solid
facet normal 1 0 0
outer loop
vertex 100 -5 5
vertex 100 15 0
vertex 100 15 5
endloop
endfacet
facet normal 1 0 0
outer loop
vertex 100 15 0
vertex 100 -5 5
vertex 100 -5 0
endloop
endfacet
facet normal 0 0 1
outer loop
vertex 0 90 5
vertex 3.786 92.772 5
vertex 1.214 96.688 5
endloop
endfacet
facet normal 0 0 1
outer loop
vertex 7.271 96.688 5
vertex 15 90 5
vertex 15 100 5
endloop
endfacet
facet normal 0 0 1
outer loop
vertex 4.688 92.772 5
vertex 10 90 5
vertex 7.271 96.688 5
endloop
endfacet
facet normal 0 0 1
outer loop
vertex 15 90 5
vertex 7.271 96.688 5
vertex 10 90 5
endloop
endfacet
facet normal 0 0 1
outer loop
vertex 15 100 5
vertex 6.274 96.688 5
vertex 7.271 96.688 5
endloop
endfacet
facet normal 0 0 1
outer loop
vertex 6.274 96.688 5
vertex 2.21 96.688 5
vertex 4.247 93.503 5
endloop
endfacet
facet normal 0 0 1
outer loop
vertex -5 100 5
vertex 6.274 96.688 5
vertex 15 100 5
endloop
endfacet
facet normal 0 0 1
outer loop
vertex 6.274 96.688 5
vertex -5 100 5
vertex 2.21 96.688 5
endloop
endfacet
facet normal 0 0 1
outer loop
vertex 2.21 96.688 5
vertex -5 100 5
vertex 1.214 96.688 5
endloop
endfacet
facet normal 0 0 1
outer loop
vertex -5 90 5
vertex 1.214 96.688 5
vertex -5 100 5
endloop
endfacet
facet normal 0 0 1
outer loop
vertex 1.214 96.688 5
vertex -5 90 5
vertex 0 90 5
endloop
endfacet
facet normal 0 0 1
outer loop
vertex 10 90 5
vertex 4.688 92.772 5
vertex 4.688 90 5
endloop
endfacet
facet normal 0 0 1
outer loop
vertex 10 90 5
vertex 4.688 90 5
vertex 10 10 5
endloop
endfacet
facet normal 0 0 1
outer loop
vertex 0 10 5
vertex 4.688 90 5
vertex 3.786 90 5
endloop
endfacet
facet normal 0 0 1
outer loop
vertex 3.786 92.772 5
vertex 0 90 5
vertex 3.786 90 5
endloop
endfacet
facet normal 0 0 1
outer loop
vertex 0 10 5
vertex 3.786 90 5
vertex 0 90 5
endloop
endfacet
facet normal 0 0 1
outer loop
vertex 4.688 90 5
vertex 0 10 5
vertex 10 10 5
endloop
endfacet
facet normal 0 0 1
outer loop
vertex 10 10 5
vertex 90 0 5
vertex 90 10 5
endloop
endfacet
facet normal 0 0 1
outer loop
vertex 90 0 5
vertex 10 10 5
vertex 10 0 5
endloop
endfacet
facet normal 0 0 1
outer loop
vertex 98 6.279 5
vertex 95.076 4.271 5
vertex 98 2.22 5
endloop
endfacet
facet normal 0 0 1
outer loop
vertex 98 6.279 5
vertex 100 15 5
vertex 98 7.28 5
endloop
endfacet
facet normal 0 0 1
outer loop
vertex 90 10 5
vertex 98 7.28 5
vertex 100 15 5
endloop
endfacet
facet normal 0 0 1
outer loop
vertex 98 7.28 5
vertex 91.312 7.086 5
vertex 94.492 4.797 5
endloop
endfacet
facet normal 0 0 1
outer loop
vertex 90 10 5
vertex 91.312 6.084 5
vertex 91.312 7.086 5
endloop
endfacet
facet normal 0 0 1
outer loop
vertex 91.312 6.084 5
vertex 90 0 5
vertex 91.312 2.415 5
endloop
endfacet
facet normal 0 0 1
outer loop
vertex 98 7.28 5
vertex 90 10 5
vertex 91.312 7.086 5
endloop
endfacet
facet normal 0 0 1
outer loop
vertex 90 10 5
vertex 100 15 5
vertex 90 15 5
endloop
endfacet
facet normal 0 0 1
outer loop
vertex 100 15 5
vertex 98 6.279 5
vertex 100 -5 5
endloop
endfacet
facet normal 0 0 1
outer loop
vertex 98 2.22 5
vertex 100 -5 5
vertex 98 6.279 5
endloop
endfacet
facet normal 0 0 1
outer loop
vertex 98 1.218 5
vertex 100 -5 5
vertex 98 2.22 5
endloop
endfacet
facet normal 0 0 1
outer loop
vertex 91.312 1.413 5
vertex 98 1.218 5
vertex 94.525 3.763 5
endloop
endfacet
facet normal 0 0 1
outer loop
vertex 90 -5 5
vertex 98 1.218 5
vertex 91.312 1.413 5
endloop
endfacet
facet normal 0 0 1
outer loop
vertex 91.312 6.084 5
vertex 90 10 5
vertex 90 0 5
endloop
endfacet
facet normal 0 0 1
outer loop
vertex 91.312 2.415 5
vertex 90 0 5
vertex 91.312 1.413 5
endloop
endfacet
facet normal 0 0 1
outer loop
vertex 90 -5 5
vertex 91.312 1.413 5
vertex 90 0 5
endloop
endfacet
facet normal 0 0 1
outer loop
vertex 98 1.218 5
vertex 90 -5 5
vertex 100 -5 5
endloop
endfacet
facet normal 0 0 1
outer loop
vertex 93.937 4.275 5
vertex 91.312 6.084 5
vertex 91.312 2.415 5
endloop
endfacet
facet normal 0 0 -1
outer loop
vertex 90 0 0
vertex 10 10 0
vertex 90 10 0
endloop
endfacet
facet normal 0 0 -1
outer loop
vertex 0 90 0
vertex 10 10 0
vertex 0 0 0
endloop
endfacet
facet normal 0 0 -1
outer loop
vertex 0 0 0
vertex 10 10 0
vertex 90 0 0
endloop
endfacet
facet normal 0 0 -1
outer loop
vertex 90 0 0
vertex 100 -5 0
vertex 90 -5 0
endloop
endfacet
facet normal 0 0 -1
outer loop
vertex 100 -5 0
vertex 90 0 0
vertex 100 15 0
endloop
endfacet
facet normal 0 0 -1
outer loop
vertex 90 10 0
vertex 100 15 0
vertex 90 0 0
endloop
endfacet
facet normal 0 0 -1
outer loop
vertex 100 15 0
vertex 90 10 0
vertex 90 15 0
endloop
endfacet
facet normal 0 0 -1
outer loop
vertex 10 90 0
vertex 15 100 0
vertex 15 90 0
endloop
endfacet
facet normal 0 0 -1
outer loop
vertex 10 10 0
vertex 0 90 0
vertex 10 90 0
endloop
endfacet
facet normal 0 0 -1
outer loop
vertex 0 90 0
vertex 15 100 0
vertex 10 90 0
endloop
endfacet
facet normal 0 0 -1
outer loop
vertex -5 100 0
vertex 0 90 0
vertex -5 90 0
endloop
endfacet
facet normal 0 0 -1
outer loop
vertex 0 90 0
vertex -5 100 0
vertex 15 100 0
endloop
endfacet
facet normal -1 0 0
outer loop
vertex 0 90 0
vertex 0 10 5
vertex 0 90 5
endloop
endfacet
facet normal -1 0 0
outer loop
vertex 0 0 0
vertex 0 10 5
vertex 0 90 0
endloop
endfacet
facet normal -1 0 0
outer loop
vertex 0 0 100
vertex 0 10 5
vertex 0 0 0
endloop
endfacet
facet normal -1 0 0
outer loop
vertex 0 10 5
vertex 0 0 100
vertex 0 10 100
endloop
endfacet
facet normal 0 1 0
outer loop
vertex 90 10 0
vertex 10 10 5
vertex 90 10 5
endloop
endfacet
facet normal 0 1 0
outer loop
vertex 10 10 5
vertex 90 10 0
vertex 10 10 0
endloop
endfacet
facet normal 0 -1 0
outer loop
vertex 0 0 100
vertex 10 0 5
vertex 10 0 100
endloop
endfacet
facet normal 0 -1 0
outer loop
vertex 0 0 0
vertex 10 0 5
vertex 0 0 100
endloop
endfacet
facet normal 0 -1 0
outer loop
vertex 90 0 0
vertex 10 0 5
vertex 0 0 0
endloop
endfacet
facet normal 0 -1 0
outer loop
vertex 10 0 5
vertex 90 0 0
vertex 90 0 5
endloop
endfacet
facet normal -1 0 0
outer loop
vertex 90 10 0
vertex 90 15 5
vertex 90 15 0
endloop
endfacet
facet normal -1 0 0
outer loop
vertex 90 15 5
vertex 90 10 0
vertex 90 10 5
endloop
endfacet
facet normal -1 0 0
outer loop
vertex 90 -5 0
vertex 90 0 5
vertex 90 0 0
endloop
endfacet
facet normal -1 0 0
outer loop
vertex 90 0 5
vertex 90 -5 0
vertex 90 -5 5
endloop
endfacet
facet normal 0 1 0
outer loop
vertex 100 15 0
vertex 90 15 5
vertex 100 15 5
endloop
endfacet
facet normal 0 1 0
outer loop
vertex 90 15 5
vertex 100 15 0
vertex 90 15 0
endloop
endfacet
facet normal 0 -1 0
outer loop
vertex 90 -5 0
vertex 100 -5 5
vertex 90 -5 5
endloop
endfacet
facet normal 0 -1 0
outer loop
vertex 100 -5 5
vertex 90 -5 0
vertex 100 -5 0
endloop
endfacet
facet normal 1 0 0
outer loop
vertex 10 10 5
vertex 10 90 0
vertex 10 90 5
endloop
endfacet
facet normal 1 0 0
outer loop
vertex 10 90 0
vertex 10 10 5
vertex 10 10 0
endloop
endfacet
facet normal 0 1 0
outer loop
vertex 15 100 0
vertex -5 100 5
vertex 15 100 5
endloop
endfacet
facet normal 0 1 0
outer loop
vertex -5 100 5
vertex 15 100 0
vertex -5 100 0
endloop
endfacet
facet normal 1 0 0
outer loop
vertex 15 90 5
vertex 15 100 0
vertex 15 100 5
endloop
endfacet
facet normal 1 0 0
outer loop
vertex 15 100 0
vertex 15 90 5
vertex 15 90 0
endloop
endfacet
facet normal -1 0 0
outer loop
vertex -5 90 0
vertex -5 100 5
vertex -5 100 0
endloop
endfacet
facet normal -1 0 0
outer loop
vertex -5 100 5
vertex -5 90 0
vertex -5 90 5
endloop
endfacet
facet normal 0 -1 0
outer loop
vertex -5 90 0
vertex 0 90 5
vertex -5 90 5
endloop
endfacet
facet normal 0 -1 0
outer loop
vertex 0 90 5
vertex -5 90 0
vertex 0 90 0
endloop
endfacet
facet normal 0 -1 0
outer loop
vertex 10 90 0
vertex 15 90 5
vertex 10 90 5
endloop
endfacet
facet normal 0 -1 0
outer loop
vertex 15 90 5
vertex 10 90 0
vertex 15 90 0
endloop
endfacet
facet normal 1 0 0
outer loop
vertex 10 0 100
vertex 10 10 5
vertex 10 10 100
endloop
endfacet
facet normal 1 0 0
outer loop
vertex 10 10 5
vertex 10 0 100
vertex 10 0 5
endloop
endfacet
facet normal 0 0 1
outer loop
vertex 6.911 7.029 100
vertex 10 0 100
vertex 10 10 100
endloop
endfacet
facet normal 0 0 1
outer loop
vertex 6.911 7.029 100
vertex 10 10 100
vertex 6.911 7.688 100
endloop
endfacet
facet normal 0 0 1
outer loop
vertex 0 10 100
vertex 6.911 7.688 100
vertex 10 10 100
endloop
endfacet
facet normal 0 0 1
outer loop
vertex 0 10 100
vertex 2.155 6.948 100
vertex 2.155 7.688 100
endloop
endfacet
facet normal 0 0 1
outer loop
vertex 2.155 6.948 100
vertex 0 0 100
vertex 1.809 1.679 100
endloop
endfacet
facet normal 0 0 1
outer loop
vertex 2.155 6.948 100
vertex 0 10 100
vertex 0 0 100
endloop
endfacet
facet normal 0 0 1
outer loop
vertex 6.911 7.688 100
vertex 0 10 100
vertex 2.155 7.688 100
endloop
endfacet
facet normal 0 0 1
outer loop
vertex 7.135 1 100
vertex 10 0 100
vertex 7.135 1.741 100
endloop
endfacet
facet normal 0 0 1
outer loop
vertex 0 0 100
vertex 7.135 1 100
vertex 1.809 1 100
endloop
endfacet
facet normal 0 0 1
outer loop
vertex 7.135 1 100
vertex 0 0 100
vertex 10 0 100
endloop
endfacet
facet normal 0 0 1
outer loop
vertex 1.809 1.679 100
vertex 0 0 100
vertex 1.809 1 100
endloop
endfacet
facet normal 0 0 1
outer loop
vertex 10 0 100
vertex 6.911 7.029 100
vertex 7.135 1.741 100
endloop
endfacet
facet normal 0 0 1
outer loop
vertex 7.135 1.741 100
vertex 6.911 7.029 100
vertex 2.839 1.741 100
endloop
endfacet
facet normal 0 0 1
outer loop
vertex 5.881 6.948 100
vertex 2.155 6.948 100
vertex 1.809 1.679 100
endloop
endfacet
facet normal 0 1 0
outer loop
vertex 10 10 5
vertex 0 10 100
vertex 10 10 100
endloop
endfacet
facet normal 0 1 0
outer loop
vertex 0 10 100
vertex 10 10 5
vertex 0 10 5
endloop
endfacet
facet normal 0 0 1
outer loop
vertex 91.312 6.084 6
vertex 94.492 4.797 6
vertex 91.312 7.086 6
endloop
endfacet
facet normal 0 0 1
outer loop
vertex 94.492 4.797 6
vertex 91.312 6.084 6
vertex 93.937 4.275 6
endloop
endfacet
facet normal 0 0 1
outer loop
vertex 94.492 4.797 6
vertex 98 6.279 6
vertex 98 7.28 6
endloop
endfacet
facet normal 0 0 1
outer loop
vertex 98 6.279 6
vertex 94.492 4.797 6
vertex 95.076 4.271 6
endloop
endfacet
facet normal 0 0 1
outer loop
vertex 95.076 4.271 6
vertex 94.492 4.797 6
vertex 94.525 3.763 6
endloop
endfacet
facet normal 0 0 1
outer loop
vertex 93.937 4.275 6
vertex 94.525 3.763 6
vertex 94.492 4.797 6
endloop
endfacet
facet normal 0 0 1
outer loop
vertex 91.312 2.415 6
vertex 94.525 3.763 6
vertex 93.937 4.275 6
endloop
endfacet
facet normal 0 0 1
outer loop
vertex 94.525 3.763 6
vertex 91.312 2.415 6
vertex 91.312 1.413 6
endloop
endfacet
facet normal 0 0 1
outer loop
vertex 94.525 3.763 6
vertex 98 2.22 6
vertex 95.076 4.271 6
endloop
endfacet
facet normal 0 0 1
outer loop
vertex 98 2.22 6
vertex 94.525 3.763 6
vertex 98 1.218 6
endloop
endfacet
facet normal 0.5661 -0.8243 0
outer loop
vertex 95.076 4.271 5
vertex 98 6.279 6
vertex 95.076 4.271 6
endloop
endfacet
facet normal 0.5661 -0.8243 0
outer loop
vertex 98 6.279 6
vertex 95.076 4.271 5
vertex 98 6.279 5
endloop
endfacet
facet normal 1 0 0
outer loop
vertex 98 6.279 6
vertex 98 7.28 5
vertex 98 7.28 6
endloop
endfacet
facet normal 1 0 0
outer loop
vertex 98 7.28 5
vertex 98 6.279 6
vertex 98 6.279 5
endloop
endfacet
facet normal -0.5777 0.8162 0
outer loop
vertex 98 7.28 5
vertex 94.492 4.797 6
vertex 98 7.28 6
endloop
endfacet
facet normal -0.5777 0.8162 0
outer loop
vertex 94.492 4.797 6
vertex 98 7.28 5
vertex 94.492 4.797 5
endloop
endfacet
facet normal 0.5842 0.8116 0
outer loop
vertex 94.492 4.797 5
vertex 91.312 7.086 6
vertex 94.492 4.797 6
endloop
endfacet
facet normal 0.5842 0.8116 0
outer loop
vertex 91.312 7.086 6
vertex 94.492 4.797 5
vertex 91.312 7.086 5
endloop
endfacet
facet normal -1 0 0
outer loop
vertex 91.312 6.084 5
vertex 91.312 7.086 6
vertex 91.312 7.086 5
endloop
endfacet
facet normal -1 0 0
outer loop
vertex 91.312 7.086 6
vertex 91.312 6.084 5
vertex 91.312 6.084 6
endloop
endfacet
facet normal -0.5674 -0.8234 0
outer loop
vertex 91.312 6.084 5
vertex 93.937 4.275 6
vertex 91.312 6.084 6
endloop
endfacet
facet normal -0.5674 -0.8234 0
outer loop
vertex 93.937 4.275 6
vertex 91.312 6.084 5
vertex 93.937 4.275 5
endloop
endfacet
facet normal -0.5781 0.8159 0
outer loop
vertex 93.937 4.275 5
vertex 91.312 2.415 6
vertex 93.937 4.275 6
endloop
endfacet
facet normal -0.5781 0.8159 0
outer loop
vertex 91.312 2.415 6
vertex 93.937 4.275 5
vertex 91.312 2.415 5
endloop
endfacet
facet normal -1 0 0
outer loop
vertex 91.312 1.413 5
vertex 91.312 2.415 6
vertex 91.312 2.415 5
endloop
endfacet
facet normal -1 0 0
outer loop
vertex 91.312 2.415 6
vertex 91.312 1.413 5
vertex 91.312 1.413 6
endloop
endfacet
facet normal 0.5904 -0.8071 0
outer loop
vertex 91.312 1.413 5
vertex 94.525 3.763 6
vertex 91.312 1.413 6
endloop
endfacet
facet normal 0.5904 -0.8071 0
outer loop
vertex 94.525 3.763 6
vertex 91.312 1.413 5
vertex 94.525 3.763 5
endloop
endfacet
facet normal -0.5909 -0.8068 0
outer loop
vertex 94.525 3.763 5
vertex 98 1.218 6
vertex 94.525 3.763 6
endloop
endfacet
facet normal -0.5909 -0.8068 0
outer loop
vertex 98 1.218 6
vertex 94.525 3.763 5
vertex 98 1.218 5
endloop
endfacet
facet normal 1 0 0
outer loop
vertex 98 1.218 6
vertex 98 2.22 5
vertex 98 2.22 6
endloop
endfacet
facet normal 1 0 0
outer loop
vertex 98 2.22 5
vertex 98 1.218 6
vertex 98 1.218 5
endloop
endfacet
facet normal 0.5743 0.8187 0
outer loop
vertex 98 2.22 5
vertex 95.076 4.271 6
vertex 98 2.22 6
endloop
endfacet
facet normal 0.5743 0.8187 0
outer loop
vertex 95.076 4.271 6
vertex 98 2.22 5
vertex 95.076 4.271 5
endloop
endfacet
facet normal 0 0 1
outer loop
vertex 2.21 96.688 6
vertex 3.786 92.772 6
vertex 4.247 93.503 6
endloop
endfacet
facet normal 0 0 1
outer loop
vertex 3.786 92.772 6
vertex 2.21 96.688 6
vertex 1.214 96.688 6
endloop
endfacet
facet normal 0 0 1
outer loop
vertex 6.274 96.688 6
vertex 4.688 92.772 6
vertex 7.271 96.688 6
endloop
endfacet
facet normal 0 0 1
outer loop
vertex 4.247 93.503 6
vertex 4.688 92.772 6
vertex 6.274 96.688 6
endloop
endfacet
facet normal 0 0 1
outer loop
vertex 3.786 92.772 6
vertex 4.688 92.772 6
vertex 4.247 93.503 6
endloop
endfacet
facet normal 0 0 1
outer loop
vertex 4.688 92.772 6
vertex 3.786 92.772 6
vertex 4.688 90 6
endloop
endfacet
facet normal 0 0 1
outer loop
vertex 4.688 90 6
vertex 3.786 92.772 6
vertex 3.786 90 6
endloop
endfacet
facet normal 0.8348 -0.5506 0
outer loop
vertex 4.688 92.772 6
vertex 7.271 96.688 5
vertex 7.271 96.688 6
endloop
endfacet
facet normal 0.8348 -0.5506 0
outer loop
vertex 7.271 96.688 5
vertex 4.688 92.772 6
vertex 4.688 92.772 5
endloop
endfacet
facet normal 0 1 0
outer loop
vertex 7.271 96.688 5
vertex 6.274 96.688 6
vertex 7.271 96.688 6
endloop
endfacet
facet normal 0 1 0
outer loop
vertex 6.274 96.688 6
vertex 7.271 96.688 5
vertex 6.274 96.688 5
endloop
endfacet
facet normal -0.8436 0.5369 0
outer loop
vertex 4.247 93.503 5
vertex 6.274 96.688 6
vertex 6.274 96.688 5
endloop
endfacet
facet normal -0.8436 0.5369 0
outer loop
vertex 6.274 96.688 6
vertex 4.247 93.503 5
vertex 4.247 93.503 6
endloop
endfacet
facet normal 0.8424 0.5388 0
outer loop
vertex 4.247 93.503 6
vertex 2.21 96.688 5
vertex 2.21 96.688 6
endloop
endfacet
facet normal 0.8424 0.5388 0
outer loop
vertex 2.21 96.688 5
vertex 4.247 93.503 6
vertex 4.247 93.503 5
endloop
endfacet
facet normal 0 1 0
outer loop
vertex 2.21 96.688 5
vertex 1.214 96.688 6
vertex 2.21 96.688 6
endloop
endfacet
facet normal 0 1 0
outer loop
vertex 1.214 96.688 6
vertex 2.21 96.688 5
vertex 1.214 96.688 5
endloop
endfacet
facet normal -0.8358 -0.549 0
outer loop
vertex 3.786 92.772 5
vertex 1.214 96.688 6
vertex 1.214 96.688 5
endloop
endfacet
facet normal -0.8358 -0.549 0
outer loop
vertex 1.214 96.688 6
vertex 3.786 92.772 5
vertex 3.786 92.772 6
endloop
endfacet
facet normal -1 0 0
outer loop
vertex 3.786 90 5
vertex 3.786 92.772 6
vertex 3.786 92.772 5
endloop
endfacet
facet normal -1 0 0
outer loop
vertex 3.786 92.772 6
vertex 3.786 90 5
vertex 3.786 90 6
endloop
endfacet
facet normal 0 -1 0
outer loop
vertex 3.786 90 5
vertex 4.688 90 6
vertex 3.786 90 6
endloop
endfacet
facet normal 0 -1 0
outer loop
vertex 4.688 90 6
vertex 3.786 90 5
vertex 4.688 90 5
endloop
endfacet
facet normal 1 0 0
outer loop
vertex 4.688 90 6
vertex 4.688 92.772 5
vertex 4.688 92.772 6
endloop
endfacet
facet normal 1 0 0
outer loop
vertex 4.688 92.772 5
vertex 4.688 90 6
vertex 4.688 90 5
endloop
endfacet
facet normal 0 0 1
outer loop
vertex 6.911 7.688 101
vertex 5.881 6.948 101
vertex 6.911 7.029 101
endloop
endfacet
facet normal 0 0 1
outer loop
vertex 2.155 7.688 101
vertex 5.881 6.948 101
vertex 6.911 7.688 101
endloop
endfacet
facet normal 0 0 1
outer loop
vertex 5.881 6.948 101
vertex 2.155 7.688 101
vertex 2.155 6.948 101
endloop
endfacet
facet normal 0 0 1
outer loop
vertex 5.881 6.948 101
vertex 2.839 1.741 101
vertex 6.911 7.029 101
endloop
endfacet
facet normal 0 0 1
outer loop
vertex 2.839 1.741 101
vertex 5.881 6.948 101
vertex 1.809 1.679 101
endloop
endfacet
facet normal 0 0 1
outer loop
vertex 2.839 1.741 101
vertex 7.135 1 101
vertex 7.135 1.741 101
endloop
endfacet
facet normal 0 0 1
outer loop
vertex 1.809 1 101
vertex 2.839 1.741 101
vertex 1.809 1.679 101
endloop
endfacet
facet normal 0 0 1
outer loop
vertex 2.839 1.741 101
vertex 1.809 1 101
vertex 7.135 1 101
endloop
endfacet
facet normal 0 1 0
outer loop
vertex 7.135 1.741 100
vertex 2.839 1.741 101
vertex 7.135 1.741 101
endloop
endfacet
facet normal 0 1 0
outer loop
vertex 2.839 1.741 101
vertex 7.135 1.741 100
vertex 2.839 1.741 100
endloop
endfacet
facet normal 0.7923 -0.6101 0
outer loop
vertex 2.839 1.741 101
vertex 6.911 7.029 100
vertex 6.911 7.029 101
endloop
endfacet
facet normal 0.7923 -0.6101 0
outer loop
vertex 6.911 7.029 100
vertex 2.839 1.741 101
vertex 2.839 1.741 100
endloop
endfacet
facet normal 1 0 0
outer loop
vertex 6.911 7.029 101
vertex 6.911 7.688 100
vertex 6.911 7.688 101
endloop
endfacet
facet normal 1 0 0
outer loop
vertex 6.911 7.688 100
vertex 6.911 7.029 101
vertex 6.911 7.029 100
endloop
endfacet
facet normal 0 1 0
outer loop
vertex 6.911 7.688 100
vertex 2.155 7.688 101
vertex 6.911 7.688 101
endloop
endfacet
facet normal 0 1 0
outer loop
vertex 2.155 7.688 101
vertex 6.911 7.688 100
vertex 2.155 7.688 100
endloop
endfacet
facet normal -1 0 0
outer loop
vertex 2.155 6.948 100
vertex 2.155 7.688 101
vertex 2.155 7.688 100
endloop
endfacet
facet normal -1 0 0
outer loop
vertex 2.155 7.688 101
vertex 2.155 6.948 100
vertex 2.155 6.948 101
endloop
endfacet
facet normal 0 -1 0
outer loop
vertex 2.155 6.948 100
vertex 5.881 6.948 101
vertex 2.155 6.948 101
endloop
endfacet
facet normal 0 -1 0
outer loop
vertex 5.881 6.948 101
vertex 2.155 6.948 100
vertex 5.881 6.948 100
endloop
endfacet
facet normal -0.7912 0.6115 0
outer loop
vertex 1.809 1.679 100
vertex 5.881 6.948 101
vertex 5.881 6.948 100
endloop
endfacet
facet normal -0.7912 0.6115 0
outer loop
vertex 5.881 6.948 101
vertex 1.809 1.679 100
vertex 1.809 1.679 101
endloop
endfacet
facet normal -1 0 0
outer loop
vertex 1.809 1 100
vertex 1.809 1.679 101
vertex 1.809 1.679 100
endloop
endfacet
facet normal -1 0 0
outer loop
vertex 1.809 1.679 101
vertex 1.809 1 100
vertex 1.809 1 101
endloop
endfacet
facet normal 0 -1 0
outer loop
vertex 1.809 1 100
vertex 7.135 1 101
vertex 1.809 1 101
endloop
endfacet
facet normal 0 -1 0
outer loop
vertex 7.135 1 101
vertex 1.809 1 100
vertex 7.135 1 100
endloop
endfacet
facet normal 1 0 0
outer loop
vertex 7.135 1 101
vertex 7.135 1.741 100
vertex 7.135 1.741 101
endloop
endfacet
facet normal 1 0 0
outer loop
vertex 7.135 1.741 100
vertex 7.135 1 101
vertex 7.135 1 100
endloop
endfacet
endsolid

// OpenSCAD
x_len = 100;
y_len = 100;
z_len = 100;

height = 5;
width = 10;
xy_head_len = 10;

///////////////////////////////////////////////////////////////////////
// Text

// X
translate([0,0,height])
    linear_extrude(height=1)
        translate([x_len-2,1])
            rotate([0,0,90])
                text("X", size=7, font = "Liberation Sans");

// Y
translate([0,0,height])
    linear_extrude(height=1)
        translate([1,y_len - xy_head_len])
            text("Y", size=7, font="Liberation Sans");

// Z
translate([0,0,z_len])
    linear_extrude(height=1)
        translate([1.5,1])
            text("Z", size=7, font="Liberation Sans");
            

// Bars
difference() {
    union() {
        // X
        cube([x_len,width,height]);
        translate([x_len-xy_head_len,-5,0]) cube([xy_head_len,2 * width,height]);
        
        // Y
        cube([width,y_len,height]);
        translate([-5,y_len-xy_head_len,0]) cube([2 * width,xy_head_len,height]);
        
        // Z
        cube([width,width,z_len]);
    }
 }
